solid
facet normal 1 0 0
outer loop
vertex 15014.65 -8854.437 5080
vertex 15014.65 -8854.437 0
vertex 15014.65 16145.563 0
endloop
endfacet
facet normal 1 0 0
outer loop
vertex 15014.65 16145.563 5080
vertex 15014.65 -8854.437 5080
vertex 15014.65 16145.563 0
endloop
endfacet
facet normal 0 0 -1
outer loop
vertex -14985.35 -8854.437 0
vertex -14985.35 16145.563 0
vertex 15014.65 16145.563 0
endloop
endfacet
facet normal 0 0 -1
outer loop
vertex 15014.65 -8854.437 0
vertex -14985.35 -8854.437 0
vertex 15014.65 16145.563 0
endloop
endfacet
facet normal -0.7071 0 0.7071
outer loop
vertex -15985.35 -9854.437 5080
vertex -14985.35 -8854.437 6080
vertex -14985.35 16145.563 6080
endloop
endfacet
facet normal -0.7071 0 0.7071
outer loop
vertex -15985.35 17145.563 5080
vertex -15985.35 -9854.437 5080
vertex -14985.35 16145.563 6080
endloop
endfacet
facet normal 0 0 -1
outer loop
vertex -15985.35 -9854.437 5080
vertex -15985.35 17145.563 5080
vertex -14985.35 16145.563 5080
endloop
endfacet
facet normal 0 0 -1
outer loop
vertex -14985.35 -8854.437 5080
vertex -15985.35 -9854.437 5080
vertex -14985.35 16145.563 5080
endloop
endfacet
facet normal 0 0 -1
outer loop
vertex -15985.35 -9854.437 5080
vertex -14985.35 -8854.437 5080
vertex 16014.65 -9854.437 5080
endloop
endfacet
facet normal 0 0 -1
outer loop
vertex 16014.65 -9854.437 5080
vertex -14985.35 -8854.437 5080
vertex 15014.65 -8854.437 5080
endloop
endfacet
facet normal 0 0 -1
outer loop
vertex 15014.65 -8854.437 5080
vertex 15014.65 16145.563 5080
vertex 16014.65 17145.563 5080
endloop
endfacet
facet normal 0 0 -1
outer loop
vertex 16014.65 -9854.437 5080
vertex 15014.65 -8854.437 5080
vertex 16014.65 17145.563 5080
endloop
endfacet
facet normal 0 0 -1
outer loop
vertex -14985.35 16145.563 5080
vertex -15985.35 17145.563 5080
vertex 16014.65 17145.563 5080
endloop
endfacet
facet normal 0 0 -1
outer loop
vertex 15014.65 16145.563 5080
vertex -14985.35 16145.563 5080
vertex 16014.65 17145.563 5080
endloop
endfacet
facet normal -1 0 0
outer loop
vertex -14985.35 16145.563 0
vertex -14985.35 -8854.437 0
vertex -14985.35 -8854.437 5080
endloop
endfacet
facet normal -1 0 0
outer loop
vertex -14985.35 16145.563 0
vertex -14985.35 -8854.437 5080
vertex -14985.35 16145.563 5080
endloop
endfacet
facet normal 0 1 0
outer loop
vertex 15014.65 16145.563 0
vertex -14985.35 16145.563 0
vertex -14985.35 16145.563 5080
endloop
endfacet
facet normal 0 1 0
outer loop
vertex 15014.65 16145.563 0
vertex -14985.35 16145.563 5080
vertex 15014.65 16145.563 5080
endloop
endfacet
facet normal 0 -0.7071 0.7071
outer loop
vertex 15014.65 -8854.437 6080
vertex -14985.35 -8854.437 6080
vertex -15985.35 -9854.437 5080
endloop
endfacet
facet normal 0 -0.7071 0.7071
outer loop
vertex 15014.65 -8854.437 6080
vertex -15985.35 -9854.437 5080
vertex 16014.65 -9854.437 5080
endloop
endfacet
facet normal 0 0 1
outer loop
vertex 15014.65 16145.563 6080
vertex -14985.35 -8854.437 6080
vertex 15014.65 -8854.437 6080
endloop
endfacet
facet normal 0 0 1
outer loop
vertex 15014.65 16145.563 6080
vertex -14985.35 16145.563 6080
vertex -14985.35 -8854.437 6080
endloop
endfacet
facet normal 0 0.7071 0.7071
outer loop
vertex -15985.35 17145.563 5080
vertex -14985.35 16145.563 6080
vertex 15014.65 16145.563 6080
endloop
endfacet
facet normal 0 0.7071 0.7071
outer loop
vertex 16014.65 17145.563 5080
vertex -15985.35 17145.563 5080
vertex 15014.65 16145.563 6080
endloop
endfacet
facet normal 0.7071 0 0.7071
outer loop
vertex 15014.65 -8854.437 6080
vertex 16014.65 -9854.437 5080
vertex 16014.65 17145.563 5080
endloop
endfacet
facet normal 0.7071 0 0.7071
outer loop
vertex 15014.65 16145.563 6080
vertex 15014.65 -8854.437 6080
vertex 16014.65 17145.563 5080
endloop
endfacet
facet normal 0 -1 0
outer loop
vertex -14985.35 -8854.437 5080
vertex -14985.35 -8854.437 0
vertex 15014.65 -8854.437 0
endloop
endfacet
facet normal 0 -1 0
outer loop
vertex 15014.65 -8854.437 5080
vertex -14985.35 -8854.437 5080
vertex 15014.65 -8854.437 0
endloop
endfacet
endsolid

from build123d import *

# Parameters (mm, degrees)
F0_W     = 30000
F0_H     = 25000
F1_DEPTH = 5080
F2_W     = 32000
F2_H     = 27000
F3_DEPTH = 1000
F4_SIZE  = 999.99999


# Not quite as in the source:
# - a fillet or chamfer is up to 0.001 mm smaller than in the source, because OpenCascade refuses the exact size


with BuildPart() as f1:
    # F0 (on Top) → F1 (new body)
    with BuildSketch(Plane.XY):
        with Locations((14.6500738338, 3645.5633971739)):
            Rectangle(F0_W, F0_H)
    extrude(amount=F1_DEPTH)

    # F2 (on face) → F3 (join)
    with BuildSketch(Plane.XY.offset(5080)):
        with Locations((14.6500738338, 3645.5633971739)):
            Rectangle(F2_W, F2_H)
    extrude(amount=F3_DEPTH)

    # F4 (size 1000 in the source; OpenCascade refuses exactly that, so slightly less here)
    f4_edges = [f1.edges().sort_by_distance(p)[0] for p in [
        (14.650074, -9854.436603, 6080),
        (16014.650074, 3645.563397, 6080),
        (14.650074, 17145.563397, 6080),
        (-15985.349926, 3645.563397, 6080),
    ]]
    chamfer(f4_edges, length=F4_SIZE)


solid = f1.part
